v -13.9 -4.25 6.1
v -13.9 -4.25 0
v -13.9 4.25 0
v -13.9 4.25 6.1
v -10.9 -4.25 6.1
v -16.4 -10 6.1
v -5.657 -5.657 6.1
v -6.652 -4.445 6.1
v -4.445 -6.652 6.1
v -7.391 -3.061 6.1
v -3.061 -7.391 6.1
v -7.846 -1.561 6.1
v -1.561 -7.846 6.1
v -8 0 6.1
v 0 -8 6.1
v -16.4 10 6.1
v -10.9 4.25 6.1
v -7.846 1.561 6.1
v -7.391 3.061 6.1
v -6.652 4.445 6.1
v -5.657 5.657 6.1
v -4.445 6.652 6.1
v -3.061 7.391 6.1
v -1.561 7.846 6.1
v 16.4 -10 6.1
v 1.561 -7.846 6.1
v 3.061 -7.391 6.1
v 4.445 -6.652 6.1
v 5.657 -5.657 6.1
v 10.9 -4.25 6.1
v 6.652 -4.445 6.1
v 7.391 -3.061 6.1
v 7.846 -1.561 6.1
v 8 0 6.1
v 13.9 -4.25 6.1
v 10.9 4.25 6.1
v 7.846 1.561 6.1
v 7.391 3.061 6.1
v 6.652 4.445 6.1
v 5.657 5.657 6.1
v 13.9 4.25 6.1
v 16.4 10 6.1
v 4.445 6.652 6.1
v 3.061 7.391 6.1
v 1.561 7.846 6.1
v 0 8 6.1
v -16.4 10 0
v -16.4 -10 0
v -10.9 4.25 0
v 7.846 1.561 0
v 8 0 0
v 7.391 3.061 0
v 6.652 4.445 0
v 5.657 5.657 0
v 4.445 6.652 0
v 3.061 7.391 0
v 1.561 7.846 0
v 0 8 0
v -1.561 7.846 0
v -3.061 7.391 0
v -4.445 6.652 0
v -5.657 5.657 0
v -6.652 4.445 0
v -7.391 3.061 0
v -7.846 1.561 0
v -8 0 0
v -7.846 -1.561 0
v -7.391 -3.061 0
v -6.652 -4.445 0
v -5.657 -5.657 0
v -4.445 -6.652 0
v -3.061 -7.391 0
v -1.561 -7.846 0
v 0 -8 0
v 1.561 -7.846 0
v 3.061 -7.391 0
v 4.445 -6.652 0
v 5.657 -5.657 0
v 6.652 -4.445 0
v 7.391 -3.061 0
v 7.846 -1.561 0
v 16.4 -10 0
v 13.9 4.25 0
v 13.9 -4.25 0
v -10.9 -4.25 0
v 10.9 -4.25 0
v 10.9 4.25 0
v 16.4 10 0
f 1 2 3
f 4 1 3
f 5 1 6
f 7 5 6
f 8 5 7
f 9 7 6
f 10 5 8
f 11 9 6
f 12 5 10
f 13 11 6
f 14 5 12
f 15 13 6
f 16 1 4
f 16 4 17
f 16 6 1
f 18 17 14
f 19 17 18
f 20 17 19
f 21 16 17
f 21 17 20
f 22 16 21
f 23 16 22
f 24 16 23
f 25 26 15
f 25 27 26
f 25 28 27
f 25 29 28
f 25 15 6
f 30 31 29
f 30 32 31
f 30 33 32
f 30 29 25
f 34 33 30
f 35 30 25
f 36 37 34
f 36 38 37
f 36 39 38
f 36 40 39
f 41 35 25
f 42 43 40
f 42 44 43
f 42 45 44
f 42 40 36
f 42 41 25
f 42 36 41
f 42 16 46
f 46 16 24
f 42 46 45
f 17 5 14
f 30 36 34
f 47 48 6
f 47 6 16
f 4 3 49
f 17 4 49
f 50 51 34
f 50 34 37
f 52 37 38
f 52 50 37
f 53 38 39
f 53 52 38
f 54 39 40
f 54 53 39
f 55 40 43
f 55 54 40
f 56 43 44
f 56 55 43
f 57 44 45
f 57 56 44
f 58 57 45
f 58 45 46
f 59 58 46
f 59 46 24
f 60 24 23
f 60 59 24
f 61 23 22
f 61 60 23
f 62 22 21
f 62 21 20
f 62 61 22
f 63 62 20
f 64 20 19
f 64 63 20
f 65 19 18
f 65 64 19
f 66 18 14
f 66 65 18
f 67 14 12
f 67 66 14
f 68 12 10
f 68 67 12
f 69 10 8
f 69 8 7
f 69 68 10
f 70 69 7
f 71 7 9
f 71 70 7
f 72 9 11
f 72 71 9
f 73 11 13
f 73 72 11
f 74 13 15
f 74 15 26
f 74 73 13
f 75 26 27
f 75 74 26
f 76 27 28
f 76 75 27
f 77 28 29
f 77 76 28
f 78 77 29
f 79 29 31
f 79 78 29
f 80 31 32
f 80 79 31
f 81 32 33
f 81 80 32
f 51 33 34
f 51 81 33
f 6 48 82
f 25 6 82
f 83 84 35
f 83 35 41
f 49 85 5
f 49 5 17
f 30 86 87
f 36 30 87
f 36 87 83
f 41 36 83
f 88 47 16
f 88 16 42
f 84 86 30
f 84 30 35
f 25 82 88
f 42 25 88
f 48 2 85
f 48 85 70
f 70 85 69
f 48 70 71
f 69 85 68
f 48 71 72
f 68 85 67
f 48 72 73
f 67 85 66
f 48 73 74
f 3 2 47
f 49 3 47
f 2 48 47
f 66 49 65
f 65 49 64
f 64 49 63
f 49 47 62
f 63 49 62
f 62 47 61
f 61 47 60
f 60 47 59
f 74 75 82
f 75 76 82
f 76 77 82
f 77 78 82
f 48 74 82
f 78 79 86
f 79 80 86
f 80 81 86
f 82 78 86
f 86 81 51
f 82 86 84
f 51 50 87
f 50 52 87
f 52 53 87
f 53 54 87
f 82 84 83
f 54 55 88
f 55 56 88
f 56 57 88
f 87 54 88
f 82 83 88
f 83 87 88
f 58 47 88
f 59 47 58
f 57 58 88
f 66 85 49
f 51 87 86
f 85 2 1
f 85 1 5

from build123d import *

# Parameters (mm, degrees)
SKETCH1_W           = 32.8
SKETCH1_H           = 20
SKETCH1_R           = 8
SKETCH1_W_2         = 3
SKETCH1_H_2         = 8.5
BOSS_EXTRUDE1_DEPTH = 6.1


with BuildPart() as part:
    # Sketch1 → Boss-Extrude1 (new body)
    with BuildSketch(Plane.XY):
        Rectangle(SKETCH1_W, SKETCH1_H)
        Circle(SKETCH1_R, mode=Mode.SUBTRACT)
        with Locations((12.4, 0)):
            Rectangle(SKETCH1_W_2, SKETCH1_H_2, mode=Mode.SUBTRACT)
        with Locations((-12.4, 0)):
            Rectangle(SKETCH1_W_2, SKETCH1_H_2, mode=Mode.SUBTRACT)
    extrude(amount=BOSS_EXTRUDE1_DEPTH)


solid = part.part
